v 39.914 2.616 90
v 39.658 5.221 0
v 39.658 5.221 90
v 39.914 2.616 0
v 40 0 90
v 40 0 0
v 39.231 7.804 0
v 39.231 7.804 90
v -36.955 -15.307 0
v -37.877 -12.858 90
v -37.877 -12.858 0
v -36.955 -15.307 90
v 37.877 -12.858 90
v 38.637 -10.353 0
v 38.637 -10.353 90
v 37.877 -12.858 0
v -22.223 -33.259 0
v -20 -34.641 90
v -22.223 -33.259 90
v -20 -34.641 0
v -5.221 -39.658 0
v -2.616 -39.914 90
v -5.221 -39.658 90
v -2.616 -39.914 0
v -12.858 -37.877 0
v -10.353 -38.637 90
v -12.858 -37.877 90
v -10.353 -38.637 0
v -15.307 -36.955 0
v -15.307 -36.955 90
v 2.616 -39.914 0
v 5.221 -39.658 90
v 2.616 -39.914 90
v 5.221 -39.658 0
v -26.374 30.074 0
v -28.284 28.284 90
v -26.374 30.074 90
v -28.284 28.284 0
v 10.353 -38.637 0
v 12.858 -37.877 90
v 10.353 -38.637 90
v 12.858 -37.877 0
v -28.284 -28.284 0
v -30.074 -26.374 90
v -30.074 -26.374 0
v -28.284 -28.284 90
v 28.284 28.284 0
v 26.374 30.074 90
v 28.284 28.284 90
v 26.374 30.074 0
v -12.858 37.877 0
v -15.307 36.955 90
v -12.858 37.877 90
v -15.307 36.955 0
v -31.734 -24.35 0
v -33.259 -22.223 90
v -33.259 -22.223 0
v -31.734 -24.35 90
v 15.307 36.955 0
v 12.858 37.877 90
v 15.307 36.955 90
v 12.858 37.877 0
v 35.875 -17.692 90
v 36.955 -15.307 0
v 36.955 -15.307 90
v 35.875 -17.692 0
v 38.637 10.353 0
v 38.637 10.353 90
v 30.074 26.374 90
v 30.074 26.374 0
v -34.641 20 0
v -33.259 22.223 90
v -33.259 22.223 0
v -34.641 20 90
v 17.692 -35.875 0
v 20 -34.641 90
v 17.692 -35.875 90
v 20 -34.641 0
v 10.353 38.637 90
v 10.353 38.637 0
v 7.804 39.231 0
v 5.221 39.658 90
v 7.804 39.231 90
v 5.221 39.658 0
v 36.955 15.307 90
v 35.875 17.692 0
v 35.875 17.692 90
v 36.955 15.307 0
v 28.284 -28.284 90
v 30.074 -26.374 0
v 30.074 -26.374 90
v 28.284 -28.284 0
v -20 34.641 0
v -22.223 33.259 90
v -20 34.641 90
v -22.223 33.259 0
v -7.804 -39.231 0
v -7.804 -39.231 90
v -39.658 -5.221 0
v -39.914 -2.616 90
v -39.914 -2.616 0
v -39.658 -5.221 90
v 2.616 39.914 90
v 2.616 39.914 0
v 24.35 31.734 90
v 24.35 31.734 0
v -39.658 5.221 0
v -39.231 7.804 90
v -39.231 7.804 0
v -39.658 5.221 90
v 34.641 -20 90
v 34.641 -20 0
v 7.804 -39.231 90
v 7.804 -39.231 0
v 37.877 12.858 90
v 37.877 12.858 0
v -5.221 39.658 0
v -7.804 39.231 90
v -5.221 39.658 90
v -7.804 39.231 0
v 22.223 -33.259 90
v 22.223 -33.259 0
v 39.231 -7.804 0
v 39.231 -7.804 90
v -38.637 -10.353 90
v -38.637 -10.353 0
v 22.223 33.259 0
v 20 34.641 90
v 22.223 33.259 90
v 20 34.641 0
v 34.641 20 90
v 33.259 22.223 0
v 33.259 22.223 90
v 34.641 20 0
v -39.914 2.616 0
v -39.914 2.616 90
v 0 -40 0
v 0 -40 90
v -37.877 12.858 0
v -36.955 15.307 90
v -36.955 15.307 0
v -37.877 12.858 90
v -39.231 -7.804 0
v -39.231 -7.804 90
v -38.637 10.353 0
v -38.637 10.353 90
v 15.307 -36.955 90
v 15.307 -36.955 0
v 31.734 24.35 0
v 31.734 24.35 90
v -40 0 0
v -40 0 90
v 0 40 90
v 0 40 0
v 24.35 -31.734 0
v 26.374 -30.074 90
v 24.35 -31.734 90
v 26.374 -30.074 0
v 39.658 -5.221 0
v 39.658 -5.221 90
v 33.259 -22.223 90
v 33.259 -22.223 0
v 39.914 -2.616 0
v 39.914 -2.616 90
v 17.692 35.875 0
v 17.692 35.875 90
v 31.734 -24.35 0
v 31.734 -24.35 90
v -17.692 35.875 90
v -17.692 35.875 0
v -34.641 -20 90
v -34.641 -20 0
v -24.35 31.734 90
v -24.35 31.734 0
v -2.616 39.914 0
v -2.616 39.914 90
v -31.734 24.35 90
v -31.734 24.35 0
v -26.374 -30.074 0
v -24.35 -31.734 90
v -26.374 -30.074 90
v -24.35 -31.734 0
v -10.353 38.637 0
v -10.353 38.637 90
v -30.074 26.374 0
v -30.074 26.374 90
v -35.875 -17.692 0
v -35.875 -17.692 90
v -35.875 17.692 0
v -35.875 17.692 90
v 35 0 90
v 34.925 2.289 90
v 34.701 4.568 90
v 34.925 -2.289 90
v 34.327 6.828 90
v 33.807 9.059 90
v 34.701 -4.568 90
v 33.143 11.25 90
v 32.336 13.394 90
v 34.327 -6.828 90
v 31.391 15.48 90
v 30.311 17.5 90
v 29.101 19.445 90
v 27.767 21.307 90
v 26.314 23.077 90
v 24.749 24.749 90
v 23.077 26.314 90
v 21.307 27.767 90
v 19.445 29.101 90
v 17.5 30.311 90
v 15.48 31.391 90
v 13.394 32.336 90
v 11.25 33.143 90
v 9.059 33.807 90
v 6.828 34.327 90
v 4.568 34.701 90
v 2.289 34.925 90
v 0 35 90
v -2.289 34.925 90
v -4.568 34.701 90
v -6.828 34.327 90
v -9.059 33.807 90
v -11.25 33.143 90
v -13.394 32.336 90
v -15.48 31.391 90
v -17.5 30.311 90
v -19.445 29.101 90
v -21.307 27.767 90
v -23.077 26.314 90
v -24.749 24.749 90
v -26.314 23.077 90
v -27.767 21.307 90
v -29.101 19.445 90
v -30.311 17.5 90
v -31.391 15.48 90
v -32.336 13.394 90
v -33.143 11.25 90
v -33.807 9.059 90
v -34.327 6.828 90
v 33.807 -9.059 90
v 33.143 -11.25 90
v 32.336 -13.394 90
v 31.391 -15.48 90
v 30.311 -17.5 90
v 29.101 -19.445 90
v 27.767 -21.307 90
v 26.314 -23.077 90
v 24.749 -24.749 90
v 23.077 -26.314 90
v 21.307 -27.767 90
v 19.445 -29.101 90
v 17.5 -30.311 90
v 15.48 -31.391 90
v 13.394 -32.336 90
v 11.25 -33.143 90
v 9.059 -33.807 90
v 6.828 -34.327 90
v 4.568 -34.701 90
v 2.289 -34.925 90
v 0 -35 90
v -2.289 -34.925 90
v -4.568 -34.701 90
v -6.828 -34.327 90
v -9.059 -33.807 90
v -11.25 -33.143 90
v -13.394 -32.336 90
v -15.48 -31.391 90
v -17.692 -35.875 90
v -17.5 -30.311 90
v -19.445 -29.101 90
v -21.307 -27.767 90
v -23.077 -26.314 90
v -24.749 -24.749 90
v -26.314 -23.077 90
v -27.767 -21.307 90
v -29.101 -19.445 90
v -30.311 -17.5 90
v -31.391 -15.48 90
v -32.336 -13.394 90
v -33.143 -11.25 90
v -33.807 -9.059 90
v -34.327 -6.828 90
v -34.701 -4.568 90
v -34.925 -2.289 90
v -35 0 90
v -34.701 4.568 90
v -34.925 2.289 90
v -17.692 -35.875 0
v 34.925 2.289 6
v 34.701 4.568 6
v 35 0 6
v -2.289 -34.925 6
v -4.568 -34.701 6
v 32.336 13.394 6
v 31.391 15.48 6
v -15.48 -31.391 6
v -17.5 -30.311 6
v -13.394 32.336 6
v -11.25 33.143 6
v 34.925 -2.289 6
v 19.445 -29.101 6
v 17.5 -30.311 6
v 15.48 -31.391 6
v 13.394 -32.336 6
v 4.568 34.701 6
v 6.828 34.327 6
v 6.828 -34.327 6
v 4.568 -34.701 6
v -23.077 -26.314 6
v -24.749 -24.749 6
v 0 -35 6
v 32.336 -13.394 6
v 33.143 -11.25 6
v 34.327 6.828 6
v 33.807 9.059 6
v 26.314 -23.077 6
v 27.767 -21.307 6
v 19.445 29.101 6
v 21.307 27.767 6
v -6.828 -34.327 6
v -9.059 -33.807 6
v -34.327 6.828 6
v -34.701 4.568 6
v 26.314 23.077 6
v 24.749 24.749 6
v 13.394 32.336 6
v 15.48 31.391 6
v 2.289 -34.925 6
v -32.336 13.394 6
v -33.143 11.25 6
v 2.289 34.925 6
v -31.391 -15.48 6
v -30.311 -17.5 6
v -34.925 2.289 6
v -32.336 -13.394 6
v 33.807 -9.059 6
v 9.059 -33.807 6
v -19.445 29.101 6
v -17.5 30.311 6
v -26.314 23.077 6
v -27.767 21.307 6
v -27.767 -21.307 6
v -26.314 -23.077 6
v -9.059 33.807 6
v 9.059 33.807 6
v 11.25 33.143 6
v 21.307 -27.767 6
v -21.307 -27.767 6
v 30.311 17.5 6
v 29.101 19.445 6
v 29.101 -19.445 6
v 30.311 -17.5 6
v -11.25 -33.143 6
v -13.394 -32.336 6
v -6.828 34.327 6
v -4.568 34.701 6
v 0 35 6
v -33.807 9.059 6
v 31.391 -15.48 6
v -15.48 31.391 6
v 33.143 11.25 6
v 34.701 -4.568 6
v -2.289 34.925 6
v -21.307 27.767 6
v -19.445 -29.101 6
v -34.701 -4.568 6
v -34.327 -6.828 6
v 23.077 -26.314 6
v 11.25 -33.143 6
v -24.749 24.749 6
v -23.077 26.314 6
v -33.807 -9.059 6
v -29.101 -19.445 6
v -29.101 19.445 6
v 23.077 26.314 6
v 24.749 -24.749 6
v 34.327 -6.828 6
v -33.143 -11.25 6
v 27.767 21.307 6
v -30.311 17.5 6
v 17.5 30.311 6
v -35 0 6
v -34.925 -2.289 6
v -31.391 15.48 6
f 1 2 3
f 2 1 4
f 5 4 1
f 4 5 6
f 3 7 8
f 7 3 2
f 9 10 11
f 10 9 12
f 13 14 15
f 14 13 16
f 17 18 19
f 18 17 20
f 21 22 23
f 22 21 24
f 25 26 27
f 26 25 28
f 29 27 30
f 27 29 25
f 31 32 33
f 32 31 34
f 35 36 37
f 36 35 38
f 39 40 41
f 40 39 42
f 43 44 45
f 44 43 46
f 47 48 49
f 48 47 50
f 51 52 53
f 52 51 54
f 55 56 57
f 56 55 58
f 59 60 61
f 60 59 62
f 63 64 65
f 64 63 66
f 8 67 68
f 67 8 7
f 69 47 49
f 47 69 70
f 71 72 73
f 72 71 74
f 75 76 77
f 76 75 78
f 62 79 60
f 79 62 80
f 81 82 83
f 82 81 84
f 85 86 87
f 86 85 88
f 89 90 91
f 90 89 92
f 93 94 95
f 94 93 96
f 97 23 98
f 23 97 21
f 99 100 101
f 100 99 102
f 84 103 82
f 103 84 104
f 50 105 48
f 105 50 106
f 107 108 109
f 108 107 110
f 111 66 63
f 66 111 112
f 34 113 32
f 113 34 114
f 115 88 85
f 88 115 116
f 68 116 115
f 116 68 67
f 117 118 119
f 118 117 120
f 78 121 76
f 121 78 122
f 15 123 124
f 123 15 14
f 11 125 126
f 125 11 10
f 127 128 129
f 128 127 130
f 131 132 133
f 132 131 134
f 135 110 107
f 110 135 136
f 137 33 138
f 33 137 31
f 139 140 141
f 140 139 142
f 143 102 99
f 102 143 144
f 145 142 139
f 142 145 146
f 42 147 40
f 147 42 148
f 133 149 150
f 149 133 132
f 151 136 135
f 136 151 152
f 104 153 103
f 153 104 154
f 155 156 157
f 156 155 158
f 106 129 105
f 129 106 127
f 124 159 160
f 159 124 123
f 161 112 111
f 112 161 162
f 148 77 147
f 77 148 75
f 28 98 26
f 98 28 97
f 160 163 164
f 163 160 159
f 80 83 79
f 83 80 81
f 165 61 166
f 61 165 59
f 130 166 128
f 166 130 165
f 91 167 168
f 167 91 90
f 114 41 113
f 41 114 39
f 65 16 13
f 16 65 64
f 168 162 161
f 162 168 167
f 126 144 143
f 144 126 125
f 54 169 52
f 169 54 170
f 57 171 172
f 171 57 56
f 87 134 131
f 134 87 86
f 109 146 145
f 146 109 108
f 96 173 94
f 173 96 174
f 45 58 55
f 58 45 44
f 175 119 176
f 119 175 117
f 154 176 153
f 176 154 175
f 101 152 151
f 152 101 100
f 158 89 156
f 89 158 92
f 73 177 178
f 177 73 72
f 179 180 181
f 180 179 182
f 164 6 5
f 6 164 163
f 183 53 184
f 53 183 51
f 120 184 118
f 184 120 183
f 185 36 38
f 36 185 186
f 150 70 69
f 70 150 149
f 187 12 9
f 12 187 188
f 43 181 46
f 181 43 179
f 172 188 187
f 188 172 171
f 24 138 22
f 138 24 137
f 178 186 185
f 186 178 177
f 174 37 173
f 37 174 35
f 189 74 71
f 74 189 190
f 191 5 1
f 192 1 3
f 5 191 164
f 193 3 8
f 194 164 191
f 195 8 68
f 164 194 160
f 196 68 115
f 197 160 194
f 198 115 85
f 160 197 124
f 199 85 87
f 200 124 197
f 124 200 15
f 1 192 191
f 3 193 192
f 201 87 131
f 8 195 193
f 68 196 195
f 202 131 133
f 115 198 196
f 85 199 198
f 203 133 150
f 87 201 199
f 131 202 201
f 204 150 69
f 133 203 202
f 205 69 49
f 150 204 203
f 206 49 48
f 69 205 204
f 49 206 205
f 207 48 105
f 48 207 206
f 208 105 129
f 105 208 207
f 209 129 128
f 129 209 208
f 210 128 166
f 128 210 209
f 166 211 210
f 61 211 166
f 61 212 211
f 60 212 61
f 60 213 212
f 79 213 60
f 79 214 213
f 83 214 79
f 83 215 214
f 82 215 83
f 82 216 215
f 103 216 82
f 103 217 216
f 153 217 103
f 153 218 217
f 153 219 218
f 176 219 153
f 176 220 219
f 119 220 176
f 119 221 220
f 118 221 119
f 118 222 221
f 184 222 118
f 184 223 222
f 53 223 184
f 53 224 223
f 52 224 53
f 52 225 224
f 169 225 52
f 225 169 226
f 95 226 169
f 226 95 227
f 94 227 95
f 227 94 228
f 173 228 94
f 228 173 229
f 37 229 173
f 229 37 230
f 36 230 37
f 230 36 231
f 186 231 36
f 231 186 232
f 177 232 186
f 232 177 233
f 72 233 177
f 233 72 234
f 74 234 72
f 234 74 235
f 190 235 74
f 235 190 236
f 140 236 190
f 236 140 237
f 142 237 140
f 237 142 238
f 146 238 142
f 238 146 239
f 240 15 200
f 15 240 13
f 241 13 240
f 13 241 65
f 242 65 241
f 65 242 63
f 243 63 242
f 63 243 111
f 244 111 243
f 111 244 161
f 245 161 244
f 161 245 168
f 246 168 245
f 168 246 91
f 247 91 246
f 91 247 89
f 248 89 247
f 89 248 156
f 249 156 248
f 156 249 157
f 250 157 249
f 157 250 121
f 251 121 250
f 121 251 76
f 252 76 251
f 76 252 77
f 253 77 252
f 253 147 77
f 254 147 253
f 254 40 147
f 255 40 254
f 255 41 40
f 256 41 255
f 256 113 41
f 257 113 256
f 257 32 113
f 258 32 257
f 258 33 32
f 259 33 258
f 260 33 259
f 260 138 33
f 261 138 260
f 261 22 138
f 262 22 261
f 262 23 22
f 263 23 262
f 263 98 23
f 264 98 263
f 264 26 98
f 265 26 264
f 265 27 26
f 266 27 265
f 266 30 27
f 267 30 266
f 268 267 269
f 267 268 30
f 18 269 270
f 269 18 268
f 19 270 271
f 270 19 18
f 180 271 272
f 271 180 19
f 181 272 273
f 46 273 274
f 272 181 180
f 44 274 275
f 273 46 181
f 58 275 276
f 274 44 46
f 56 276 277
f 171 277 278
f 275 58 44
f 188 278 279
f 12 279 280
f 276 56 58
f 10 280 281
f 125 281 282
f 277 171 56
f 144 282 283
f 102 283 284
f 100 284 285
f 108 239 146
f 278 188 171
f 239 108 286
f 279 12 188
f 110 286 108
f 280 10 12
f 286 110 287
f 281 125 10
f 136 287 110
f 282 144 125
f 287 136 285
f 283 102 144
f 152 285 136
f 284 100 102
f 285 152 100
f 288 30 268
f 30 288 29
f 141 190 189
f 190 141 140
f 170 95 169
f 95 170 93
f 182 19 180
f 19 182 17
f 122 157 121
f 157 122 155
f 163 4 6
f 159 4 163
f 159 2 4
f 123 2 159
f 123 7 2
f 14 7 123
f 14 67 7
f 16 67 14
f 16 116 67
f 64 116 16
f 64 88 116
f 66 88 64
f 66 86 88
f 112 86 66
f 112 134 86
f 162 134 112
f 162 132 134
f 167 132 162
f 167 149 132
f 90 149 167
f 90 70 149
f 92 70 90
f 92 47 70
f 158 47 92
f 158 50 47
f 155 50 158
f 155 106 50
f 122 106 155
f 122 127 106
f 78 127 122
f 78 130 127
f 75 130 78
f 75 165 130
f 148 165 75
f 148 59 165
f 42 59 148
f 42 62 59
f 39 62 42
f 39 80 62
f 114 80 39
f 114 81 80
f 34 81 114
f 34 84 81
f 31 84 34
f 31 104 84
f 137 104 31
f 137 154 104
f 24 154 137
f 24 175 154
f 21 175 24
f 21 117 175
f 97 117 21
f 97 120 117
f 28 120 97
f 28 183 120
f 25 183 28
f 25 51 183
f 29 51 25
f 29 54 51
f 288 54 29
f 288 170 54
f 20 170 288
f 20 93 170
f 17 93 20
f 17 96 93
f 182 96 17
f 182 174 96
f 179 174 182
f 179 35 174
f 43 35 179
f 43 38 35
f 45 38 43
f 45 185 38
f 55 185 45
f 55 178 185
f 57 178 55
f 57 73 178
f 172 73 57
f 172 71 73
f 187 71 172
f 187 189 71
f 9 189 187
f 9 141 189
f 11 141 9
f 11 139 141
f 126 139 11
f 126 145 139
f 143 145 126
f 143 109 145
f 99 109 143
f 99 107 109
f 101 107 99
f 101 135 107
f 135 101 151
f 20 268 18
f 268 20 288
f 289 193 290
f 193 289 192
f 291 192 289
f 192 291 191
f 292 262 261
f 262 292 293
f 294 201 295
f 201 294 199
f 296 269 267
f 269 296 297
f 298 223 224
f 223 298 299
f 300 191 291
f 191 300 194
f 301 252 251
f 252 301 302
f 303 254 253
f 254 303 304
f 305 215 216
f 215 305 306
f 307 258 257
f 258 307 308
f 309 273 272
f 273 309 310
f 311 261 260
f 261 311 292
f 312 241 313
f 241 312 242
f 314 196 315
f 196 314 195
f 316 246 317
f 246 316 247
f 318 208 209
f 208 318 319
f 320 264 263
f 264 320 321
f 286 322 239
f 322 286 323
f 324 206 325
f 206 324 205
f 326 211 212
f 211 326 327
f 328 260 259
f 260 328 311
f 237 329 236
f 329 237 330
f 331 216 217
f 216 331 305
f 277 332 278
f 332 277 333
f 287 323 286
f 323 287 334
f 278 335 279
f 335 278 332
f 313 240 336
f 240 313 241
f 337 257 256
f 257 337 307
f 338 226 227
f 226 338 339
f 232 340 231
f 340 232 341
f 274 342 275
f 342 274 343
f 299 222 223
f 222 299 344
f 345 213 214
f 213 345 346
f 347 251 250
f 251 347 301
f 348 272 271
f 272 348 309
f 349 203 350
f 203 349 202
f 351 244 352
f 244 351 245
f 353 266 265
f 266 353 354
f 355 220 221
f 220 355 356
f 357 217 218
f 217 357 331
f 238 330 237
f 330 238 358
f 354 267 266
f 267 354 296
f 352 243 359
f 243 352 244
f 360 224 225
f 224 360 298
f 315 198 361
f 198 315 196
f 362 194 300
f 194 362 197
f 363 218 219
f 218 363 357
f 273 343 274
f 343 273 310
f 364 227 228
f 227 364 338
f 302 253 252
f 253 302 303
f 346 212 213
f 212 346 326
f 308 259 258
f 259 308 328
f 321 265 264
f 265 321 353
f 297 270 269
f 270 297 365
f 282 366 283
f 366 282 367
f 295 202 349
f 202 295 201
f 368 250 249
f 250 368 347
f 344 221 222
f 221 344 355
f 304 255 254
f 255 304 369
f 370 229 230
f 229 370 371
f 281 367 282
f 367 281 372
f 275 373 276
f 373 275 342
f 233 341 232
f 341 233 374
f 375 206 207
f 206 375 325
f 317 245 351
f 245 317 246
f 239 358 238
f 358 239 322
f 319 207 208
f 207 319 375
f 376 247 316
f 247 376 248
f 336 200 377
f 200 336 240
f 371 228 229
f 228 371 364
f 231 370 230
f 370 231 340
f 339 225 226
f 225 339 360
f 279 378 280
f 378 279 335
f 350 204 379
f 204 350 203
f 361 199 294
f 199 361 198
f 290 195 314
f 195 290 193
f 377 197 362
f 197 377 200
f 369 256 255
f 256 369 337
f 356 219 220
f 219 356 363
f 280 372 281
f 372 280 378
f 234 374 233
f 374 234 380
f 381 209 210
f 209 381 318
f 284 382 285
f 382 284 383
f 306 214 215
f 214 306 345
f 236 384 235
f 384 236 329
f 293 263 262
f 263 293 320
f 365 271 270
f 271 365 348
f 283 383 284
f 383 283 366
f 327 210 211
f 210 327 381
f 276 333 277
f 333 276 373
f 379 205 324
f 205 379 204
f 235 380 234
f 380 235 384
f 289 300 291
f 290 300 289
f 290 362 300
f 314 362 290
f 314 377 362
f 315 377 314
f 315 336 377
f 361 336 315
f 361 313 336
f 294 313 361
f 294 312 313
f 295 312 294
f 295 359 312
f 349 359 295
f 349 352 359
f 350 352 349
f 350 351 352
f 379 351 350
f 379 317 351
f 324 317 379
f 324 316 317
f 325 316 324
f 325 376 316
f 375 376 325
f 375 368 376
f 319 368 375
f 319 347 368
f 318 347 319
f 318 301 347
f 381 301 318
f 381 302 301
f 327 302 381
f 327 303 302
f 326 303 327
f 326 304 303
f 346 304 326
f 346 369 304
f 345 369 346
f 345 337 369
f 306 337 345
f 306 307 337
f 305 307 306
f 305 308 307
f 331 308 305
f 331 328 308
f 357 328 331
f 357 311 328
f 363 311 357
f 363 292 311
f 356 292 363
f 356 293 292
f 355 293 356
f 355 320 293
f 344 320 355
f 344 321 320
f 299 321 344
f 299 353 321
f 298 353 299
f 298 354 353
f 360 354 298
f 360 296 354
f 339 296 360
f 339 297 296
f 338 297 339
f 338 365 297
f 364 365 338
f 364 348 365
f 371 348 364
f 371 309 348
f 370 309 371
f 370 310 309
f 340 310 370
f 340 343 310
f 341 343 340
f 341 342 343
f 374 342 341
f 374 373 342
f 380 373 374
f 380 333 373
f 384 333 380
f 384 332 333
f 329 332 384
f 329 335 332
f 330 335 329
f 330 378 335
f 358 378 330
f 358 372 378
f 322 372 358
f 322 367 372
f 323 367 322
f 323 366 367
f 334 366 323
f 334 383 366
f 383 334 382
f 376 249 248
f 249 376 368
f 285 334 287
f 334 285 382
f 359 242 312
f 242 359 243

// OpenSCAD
// =========================================================
//  マグカップ（取手は +X 軸方向のみ）
// =========================================================
$fn = 96;

// ---------- 本体パラメータ ----------
outer_d   = 80;                 // 外径
inner_d   = 70;                 // 内径（肉厚 5mm）
mug_h     = 90;                 // 全高
bottom_th = 6;                  // 底の厚み
outer_r   = outer_d / 2;        // 40
inner_r   = inner_d / 2;        // 35

// ---------- 取手パラメータ ----------
hole_w    = 25;                 // 取手内側の空間：幅（X 方向）
hole_h    = 30;                 // 取手内側の空間：高さ（Z 方向）
bar_t     = 9;                  // 取手の太さ（XZ 断面方向）
bar_w     = 12;                 // 取手の幅（Y 方向）
hole_x0   = outer_r + 1;        // 内側空間の開始 X（本体表面のすぐ外側）
embed     = 4;                  // 本体壁への食い込み量（壁厚 5mm 内に収める）
handle_z  = mug_h / 2;          // 取手の高さ中心（マグ中央）

// ---------- 本体（中空円筒） ----------
module body() {
    difference() {
        cylinder(h = mug_h, r = outer_r);
        translate([0, 0, bottom_th])
            cylinder(h = mug_h - bottom_th + 1, r = inner_r);
    }
}

// ---------- D 字の 2D 形状 ----------
// 左端が直線（x=0）、右側が半円。原点は直線部の中央。
module d_profile(w, h) {
    r = h / 2;
    union() {
        translate([0, -h/2]) square([w - r, h]);   // 直線部
        translate([w - r, 0]) circle(r = r);       // 半円部
    }
}

// ---------- 取手の 2D 断面（XZ 平面用） ----------
module handle_profile() {
    difference() {
        intersection() {
            // 外形：内側 D 形状をオフセットして肉付け
            offset(r = bar_t)
                translate([hole_x0, 0]) d_profile(hole_w, hole_h);
            // 本体側は直線でカット（壁の中まで食い込ませる）
            translate([outer_r - embed, -(hole_h/2 + bar_t + 1)])
                square([hole_w + 2*bar_t + 10, hole_h + 2*bar_t + 2]);
        }
        // 内側の空間（高さ 30mm × 幅 25mm）
        translate([hole_x0, 0]) d_profile(hole_w, hole_h);
    }
}

// ---------- 取手（+X 側のみ） ----------
module handle() {
    translate([0, 0, handle_z])
        rotate([90, 0, 0])
            linear_extrude(height = bar_w, center = true)
                handle_profile();
}

// ---------- 完成品 ----------
union() {
    body();
    handle();
}
